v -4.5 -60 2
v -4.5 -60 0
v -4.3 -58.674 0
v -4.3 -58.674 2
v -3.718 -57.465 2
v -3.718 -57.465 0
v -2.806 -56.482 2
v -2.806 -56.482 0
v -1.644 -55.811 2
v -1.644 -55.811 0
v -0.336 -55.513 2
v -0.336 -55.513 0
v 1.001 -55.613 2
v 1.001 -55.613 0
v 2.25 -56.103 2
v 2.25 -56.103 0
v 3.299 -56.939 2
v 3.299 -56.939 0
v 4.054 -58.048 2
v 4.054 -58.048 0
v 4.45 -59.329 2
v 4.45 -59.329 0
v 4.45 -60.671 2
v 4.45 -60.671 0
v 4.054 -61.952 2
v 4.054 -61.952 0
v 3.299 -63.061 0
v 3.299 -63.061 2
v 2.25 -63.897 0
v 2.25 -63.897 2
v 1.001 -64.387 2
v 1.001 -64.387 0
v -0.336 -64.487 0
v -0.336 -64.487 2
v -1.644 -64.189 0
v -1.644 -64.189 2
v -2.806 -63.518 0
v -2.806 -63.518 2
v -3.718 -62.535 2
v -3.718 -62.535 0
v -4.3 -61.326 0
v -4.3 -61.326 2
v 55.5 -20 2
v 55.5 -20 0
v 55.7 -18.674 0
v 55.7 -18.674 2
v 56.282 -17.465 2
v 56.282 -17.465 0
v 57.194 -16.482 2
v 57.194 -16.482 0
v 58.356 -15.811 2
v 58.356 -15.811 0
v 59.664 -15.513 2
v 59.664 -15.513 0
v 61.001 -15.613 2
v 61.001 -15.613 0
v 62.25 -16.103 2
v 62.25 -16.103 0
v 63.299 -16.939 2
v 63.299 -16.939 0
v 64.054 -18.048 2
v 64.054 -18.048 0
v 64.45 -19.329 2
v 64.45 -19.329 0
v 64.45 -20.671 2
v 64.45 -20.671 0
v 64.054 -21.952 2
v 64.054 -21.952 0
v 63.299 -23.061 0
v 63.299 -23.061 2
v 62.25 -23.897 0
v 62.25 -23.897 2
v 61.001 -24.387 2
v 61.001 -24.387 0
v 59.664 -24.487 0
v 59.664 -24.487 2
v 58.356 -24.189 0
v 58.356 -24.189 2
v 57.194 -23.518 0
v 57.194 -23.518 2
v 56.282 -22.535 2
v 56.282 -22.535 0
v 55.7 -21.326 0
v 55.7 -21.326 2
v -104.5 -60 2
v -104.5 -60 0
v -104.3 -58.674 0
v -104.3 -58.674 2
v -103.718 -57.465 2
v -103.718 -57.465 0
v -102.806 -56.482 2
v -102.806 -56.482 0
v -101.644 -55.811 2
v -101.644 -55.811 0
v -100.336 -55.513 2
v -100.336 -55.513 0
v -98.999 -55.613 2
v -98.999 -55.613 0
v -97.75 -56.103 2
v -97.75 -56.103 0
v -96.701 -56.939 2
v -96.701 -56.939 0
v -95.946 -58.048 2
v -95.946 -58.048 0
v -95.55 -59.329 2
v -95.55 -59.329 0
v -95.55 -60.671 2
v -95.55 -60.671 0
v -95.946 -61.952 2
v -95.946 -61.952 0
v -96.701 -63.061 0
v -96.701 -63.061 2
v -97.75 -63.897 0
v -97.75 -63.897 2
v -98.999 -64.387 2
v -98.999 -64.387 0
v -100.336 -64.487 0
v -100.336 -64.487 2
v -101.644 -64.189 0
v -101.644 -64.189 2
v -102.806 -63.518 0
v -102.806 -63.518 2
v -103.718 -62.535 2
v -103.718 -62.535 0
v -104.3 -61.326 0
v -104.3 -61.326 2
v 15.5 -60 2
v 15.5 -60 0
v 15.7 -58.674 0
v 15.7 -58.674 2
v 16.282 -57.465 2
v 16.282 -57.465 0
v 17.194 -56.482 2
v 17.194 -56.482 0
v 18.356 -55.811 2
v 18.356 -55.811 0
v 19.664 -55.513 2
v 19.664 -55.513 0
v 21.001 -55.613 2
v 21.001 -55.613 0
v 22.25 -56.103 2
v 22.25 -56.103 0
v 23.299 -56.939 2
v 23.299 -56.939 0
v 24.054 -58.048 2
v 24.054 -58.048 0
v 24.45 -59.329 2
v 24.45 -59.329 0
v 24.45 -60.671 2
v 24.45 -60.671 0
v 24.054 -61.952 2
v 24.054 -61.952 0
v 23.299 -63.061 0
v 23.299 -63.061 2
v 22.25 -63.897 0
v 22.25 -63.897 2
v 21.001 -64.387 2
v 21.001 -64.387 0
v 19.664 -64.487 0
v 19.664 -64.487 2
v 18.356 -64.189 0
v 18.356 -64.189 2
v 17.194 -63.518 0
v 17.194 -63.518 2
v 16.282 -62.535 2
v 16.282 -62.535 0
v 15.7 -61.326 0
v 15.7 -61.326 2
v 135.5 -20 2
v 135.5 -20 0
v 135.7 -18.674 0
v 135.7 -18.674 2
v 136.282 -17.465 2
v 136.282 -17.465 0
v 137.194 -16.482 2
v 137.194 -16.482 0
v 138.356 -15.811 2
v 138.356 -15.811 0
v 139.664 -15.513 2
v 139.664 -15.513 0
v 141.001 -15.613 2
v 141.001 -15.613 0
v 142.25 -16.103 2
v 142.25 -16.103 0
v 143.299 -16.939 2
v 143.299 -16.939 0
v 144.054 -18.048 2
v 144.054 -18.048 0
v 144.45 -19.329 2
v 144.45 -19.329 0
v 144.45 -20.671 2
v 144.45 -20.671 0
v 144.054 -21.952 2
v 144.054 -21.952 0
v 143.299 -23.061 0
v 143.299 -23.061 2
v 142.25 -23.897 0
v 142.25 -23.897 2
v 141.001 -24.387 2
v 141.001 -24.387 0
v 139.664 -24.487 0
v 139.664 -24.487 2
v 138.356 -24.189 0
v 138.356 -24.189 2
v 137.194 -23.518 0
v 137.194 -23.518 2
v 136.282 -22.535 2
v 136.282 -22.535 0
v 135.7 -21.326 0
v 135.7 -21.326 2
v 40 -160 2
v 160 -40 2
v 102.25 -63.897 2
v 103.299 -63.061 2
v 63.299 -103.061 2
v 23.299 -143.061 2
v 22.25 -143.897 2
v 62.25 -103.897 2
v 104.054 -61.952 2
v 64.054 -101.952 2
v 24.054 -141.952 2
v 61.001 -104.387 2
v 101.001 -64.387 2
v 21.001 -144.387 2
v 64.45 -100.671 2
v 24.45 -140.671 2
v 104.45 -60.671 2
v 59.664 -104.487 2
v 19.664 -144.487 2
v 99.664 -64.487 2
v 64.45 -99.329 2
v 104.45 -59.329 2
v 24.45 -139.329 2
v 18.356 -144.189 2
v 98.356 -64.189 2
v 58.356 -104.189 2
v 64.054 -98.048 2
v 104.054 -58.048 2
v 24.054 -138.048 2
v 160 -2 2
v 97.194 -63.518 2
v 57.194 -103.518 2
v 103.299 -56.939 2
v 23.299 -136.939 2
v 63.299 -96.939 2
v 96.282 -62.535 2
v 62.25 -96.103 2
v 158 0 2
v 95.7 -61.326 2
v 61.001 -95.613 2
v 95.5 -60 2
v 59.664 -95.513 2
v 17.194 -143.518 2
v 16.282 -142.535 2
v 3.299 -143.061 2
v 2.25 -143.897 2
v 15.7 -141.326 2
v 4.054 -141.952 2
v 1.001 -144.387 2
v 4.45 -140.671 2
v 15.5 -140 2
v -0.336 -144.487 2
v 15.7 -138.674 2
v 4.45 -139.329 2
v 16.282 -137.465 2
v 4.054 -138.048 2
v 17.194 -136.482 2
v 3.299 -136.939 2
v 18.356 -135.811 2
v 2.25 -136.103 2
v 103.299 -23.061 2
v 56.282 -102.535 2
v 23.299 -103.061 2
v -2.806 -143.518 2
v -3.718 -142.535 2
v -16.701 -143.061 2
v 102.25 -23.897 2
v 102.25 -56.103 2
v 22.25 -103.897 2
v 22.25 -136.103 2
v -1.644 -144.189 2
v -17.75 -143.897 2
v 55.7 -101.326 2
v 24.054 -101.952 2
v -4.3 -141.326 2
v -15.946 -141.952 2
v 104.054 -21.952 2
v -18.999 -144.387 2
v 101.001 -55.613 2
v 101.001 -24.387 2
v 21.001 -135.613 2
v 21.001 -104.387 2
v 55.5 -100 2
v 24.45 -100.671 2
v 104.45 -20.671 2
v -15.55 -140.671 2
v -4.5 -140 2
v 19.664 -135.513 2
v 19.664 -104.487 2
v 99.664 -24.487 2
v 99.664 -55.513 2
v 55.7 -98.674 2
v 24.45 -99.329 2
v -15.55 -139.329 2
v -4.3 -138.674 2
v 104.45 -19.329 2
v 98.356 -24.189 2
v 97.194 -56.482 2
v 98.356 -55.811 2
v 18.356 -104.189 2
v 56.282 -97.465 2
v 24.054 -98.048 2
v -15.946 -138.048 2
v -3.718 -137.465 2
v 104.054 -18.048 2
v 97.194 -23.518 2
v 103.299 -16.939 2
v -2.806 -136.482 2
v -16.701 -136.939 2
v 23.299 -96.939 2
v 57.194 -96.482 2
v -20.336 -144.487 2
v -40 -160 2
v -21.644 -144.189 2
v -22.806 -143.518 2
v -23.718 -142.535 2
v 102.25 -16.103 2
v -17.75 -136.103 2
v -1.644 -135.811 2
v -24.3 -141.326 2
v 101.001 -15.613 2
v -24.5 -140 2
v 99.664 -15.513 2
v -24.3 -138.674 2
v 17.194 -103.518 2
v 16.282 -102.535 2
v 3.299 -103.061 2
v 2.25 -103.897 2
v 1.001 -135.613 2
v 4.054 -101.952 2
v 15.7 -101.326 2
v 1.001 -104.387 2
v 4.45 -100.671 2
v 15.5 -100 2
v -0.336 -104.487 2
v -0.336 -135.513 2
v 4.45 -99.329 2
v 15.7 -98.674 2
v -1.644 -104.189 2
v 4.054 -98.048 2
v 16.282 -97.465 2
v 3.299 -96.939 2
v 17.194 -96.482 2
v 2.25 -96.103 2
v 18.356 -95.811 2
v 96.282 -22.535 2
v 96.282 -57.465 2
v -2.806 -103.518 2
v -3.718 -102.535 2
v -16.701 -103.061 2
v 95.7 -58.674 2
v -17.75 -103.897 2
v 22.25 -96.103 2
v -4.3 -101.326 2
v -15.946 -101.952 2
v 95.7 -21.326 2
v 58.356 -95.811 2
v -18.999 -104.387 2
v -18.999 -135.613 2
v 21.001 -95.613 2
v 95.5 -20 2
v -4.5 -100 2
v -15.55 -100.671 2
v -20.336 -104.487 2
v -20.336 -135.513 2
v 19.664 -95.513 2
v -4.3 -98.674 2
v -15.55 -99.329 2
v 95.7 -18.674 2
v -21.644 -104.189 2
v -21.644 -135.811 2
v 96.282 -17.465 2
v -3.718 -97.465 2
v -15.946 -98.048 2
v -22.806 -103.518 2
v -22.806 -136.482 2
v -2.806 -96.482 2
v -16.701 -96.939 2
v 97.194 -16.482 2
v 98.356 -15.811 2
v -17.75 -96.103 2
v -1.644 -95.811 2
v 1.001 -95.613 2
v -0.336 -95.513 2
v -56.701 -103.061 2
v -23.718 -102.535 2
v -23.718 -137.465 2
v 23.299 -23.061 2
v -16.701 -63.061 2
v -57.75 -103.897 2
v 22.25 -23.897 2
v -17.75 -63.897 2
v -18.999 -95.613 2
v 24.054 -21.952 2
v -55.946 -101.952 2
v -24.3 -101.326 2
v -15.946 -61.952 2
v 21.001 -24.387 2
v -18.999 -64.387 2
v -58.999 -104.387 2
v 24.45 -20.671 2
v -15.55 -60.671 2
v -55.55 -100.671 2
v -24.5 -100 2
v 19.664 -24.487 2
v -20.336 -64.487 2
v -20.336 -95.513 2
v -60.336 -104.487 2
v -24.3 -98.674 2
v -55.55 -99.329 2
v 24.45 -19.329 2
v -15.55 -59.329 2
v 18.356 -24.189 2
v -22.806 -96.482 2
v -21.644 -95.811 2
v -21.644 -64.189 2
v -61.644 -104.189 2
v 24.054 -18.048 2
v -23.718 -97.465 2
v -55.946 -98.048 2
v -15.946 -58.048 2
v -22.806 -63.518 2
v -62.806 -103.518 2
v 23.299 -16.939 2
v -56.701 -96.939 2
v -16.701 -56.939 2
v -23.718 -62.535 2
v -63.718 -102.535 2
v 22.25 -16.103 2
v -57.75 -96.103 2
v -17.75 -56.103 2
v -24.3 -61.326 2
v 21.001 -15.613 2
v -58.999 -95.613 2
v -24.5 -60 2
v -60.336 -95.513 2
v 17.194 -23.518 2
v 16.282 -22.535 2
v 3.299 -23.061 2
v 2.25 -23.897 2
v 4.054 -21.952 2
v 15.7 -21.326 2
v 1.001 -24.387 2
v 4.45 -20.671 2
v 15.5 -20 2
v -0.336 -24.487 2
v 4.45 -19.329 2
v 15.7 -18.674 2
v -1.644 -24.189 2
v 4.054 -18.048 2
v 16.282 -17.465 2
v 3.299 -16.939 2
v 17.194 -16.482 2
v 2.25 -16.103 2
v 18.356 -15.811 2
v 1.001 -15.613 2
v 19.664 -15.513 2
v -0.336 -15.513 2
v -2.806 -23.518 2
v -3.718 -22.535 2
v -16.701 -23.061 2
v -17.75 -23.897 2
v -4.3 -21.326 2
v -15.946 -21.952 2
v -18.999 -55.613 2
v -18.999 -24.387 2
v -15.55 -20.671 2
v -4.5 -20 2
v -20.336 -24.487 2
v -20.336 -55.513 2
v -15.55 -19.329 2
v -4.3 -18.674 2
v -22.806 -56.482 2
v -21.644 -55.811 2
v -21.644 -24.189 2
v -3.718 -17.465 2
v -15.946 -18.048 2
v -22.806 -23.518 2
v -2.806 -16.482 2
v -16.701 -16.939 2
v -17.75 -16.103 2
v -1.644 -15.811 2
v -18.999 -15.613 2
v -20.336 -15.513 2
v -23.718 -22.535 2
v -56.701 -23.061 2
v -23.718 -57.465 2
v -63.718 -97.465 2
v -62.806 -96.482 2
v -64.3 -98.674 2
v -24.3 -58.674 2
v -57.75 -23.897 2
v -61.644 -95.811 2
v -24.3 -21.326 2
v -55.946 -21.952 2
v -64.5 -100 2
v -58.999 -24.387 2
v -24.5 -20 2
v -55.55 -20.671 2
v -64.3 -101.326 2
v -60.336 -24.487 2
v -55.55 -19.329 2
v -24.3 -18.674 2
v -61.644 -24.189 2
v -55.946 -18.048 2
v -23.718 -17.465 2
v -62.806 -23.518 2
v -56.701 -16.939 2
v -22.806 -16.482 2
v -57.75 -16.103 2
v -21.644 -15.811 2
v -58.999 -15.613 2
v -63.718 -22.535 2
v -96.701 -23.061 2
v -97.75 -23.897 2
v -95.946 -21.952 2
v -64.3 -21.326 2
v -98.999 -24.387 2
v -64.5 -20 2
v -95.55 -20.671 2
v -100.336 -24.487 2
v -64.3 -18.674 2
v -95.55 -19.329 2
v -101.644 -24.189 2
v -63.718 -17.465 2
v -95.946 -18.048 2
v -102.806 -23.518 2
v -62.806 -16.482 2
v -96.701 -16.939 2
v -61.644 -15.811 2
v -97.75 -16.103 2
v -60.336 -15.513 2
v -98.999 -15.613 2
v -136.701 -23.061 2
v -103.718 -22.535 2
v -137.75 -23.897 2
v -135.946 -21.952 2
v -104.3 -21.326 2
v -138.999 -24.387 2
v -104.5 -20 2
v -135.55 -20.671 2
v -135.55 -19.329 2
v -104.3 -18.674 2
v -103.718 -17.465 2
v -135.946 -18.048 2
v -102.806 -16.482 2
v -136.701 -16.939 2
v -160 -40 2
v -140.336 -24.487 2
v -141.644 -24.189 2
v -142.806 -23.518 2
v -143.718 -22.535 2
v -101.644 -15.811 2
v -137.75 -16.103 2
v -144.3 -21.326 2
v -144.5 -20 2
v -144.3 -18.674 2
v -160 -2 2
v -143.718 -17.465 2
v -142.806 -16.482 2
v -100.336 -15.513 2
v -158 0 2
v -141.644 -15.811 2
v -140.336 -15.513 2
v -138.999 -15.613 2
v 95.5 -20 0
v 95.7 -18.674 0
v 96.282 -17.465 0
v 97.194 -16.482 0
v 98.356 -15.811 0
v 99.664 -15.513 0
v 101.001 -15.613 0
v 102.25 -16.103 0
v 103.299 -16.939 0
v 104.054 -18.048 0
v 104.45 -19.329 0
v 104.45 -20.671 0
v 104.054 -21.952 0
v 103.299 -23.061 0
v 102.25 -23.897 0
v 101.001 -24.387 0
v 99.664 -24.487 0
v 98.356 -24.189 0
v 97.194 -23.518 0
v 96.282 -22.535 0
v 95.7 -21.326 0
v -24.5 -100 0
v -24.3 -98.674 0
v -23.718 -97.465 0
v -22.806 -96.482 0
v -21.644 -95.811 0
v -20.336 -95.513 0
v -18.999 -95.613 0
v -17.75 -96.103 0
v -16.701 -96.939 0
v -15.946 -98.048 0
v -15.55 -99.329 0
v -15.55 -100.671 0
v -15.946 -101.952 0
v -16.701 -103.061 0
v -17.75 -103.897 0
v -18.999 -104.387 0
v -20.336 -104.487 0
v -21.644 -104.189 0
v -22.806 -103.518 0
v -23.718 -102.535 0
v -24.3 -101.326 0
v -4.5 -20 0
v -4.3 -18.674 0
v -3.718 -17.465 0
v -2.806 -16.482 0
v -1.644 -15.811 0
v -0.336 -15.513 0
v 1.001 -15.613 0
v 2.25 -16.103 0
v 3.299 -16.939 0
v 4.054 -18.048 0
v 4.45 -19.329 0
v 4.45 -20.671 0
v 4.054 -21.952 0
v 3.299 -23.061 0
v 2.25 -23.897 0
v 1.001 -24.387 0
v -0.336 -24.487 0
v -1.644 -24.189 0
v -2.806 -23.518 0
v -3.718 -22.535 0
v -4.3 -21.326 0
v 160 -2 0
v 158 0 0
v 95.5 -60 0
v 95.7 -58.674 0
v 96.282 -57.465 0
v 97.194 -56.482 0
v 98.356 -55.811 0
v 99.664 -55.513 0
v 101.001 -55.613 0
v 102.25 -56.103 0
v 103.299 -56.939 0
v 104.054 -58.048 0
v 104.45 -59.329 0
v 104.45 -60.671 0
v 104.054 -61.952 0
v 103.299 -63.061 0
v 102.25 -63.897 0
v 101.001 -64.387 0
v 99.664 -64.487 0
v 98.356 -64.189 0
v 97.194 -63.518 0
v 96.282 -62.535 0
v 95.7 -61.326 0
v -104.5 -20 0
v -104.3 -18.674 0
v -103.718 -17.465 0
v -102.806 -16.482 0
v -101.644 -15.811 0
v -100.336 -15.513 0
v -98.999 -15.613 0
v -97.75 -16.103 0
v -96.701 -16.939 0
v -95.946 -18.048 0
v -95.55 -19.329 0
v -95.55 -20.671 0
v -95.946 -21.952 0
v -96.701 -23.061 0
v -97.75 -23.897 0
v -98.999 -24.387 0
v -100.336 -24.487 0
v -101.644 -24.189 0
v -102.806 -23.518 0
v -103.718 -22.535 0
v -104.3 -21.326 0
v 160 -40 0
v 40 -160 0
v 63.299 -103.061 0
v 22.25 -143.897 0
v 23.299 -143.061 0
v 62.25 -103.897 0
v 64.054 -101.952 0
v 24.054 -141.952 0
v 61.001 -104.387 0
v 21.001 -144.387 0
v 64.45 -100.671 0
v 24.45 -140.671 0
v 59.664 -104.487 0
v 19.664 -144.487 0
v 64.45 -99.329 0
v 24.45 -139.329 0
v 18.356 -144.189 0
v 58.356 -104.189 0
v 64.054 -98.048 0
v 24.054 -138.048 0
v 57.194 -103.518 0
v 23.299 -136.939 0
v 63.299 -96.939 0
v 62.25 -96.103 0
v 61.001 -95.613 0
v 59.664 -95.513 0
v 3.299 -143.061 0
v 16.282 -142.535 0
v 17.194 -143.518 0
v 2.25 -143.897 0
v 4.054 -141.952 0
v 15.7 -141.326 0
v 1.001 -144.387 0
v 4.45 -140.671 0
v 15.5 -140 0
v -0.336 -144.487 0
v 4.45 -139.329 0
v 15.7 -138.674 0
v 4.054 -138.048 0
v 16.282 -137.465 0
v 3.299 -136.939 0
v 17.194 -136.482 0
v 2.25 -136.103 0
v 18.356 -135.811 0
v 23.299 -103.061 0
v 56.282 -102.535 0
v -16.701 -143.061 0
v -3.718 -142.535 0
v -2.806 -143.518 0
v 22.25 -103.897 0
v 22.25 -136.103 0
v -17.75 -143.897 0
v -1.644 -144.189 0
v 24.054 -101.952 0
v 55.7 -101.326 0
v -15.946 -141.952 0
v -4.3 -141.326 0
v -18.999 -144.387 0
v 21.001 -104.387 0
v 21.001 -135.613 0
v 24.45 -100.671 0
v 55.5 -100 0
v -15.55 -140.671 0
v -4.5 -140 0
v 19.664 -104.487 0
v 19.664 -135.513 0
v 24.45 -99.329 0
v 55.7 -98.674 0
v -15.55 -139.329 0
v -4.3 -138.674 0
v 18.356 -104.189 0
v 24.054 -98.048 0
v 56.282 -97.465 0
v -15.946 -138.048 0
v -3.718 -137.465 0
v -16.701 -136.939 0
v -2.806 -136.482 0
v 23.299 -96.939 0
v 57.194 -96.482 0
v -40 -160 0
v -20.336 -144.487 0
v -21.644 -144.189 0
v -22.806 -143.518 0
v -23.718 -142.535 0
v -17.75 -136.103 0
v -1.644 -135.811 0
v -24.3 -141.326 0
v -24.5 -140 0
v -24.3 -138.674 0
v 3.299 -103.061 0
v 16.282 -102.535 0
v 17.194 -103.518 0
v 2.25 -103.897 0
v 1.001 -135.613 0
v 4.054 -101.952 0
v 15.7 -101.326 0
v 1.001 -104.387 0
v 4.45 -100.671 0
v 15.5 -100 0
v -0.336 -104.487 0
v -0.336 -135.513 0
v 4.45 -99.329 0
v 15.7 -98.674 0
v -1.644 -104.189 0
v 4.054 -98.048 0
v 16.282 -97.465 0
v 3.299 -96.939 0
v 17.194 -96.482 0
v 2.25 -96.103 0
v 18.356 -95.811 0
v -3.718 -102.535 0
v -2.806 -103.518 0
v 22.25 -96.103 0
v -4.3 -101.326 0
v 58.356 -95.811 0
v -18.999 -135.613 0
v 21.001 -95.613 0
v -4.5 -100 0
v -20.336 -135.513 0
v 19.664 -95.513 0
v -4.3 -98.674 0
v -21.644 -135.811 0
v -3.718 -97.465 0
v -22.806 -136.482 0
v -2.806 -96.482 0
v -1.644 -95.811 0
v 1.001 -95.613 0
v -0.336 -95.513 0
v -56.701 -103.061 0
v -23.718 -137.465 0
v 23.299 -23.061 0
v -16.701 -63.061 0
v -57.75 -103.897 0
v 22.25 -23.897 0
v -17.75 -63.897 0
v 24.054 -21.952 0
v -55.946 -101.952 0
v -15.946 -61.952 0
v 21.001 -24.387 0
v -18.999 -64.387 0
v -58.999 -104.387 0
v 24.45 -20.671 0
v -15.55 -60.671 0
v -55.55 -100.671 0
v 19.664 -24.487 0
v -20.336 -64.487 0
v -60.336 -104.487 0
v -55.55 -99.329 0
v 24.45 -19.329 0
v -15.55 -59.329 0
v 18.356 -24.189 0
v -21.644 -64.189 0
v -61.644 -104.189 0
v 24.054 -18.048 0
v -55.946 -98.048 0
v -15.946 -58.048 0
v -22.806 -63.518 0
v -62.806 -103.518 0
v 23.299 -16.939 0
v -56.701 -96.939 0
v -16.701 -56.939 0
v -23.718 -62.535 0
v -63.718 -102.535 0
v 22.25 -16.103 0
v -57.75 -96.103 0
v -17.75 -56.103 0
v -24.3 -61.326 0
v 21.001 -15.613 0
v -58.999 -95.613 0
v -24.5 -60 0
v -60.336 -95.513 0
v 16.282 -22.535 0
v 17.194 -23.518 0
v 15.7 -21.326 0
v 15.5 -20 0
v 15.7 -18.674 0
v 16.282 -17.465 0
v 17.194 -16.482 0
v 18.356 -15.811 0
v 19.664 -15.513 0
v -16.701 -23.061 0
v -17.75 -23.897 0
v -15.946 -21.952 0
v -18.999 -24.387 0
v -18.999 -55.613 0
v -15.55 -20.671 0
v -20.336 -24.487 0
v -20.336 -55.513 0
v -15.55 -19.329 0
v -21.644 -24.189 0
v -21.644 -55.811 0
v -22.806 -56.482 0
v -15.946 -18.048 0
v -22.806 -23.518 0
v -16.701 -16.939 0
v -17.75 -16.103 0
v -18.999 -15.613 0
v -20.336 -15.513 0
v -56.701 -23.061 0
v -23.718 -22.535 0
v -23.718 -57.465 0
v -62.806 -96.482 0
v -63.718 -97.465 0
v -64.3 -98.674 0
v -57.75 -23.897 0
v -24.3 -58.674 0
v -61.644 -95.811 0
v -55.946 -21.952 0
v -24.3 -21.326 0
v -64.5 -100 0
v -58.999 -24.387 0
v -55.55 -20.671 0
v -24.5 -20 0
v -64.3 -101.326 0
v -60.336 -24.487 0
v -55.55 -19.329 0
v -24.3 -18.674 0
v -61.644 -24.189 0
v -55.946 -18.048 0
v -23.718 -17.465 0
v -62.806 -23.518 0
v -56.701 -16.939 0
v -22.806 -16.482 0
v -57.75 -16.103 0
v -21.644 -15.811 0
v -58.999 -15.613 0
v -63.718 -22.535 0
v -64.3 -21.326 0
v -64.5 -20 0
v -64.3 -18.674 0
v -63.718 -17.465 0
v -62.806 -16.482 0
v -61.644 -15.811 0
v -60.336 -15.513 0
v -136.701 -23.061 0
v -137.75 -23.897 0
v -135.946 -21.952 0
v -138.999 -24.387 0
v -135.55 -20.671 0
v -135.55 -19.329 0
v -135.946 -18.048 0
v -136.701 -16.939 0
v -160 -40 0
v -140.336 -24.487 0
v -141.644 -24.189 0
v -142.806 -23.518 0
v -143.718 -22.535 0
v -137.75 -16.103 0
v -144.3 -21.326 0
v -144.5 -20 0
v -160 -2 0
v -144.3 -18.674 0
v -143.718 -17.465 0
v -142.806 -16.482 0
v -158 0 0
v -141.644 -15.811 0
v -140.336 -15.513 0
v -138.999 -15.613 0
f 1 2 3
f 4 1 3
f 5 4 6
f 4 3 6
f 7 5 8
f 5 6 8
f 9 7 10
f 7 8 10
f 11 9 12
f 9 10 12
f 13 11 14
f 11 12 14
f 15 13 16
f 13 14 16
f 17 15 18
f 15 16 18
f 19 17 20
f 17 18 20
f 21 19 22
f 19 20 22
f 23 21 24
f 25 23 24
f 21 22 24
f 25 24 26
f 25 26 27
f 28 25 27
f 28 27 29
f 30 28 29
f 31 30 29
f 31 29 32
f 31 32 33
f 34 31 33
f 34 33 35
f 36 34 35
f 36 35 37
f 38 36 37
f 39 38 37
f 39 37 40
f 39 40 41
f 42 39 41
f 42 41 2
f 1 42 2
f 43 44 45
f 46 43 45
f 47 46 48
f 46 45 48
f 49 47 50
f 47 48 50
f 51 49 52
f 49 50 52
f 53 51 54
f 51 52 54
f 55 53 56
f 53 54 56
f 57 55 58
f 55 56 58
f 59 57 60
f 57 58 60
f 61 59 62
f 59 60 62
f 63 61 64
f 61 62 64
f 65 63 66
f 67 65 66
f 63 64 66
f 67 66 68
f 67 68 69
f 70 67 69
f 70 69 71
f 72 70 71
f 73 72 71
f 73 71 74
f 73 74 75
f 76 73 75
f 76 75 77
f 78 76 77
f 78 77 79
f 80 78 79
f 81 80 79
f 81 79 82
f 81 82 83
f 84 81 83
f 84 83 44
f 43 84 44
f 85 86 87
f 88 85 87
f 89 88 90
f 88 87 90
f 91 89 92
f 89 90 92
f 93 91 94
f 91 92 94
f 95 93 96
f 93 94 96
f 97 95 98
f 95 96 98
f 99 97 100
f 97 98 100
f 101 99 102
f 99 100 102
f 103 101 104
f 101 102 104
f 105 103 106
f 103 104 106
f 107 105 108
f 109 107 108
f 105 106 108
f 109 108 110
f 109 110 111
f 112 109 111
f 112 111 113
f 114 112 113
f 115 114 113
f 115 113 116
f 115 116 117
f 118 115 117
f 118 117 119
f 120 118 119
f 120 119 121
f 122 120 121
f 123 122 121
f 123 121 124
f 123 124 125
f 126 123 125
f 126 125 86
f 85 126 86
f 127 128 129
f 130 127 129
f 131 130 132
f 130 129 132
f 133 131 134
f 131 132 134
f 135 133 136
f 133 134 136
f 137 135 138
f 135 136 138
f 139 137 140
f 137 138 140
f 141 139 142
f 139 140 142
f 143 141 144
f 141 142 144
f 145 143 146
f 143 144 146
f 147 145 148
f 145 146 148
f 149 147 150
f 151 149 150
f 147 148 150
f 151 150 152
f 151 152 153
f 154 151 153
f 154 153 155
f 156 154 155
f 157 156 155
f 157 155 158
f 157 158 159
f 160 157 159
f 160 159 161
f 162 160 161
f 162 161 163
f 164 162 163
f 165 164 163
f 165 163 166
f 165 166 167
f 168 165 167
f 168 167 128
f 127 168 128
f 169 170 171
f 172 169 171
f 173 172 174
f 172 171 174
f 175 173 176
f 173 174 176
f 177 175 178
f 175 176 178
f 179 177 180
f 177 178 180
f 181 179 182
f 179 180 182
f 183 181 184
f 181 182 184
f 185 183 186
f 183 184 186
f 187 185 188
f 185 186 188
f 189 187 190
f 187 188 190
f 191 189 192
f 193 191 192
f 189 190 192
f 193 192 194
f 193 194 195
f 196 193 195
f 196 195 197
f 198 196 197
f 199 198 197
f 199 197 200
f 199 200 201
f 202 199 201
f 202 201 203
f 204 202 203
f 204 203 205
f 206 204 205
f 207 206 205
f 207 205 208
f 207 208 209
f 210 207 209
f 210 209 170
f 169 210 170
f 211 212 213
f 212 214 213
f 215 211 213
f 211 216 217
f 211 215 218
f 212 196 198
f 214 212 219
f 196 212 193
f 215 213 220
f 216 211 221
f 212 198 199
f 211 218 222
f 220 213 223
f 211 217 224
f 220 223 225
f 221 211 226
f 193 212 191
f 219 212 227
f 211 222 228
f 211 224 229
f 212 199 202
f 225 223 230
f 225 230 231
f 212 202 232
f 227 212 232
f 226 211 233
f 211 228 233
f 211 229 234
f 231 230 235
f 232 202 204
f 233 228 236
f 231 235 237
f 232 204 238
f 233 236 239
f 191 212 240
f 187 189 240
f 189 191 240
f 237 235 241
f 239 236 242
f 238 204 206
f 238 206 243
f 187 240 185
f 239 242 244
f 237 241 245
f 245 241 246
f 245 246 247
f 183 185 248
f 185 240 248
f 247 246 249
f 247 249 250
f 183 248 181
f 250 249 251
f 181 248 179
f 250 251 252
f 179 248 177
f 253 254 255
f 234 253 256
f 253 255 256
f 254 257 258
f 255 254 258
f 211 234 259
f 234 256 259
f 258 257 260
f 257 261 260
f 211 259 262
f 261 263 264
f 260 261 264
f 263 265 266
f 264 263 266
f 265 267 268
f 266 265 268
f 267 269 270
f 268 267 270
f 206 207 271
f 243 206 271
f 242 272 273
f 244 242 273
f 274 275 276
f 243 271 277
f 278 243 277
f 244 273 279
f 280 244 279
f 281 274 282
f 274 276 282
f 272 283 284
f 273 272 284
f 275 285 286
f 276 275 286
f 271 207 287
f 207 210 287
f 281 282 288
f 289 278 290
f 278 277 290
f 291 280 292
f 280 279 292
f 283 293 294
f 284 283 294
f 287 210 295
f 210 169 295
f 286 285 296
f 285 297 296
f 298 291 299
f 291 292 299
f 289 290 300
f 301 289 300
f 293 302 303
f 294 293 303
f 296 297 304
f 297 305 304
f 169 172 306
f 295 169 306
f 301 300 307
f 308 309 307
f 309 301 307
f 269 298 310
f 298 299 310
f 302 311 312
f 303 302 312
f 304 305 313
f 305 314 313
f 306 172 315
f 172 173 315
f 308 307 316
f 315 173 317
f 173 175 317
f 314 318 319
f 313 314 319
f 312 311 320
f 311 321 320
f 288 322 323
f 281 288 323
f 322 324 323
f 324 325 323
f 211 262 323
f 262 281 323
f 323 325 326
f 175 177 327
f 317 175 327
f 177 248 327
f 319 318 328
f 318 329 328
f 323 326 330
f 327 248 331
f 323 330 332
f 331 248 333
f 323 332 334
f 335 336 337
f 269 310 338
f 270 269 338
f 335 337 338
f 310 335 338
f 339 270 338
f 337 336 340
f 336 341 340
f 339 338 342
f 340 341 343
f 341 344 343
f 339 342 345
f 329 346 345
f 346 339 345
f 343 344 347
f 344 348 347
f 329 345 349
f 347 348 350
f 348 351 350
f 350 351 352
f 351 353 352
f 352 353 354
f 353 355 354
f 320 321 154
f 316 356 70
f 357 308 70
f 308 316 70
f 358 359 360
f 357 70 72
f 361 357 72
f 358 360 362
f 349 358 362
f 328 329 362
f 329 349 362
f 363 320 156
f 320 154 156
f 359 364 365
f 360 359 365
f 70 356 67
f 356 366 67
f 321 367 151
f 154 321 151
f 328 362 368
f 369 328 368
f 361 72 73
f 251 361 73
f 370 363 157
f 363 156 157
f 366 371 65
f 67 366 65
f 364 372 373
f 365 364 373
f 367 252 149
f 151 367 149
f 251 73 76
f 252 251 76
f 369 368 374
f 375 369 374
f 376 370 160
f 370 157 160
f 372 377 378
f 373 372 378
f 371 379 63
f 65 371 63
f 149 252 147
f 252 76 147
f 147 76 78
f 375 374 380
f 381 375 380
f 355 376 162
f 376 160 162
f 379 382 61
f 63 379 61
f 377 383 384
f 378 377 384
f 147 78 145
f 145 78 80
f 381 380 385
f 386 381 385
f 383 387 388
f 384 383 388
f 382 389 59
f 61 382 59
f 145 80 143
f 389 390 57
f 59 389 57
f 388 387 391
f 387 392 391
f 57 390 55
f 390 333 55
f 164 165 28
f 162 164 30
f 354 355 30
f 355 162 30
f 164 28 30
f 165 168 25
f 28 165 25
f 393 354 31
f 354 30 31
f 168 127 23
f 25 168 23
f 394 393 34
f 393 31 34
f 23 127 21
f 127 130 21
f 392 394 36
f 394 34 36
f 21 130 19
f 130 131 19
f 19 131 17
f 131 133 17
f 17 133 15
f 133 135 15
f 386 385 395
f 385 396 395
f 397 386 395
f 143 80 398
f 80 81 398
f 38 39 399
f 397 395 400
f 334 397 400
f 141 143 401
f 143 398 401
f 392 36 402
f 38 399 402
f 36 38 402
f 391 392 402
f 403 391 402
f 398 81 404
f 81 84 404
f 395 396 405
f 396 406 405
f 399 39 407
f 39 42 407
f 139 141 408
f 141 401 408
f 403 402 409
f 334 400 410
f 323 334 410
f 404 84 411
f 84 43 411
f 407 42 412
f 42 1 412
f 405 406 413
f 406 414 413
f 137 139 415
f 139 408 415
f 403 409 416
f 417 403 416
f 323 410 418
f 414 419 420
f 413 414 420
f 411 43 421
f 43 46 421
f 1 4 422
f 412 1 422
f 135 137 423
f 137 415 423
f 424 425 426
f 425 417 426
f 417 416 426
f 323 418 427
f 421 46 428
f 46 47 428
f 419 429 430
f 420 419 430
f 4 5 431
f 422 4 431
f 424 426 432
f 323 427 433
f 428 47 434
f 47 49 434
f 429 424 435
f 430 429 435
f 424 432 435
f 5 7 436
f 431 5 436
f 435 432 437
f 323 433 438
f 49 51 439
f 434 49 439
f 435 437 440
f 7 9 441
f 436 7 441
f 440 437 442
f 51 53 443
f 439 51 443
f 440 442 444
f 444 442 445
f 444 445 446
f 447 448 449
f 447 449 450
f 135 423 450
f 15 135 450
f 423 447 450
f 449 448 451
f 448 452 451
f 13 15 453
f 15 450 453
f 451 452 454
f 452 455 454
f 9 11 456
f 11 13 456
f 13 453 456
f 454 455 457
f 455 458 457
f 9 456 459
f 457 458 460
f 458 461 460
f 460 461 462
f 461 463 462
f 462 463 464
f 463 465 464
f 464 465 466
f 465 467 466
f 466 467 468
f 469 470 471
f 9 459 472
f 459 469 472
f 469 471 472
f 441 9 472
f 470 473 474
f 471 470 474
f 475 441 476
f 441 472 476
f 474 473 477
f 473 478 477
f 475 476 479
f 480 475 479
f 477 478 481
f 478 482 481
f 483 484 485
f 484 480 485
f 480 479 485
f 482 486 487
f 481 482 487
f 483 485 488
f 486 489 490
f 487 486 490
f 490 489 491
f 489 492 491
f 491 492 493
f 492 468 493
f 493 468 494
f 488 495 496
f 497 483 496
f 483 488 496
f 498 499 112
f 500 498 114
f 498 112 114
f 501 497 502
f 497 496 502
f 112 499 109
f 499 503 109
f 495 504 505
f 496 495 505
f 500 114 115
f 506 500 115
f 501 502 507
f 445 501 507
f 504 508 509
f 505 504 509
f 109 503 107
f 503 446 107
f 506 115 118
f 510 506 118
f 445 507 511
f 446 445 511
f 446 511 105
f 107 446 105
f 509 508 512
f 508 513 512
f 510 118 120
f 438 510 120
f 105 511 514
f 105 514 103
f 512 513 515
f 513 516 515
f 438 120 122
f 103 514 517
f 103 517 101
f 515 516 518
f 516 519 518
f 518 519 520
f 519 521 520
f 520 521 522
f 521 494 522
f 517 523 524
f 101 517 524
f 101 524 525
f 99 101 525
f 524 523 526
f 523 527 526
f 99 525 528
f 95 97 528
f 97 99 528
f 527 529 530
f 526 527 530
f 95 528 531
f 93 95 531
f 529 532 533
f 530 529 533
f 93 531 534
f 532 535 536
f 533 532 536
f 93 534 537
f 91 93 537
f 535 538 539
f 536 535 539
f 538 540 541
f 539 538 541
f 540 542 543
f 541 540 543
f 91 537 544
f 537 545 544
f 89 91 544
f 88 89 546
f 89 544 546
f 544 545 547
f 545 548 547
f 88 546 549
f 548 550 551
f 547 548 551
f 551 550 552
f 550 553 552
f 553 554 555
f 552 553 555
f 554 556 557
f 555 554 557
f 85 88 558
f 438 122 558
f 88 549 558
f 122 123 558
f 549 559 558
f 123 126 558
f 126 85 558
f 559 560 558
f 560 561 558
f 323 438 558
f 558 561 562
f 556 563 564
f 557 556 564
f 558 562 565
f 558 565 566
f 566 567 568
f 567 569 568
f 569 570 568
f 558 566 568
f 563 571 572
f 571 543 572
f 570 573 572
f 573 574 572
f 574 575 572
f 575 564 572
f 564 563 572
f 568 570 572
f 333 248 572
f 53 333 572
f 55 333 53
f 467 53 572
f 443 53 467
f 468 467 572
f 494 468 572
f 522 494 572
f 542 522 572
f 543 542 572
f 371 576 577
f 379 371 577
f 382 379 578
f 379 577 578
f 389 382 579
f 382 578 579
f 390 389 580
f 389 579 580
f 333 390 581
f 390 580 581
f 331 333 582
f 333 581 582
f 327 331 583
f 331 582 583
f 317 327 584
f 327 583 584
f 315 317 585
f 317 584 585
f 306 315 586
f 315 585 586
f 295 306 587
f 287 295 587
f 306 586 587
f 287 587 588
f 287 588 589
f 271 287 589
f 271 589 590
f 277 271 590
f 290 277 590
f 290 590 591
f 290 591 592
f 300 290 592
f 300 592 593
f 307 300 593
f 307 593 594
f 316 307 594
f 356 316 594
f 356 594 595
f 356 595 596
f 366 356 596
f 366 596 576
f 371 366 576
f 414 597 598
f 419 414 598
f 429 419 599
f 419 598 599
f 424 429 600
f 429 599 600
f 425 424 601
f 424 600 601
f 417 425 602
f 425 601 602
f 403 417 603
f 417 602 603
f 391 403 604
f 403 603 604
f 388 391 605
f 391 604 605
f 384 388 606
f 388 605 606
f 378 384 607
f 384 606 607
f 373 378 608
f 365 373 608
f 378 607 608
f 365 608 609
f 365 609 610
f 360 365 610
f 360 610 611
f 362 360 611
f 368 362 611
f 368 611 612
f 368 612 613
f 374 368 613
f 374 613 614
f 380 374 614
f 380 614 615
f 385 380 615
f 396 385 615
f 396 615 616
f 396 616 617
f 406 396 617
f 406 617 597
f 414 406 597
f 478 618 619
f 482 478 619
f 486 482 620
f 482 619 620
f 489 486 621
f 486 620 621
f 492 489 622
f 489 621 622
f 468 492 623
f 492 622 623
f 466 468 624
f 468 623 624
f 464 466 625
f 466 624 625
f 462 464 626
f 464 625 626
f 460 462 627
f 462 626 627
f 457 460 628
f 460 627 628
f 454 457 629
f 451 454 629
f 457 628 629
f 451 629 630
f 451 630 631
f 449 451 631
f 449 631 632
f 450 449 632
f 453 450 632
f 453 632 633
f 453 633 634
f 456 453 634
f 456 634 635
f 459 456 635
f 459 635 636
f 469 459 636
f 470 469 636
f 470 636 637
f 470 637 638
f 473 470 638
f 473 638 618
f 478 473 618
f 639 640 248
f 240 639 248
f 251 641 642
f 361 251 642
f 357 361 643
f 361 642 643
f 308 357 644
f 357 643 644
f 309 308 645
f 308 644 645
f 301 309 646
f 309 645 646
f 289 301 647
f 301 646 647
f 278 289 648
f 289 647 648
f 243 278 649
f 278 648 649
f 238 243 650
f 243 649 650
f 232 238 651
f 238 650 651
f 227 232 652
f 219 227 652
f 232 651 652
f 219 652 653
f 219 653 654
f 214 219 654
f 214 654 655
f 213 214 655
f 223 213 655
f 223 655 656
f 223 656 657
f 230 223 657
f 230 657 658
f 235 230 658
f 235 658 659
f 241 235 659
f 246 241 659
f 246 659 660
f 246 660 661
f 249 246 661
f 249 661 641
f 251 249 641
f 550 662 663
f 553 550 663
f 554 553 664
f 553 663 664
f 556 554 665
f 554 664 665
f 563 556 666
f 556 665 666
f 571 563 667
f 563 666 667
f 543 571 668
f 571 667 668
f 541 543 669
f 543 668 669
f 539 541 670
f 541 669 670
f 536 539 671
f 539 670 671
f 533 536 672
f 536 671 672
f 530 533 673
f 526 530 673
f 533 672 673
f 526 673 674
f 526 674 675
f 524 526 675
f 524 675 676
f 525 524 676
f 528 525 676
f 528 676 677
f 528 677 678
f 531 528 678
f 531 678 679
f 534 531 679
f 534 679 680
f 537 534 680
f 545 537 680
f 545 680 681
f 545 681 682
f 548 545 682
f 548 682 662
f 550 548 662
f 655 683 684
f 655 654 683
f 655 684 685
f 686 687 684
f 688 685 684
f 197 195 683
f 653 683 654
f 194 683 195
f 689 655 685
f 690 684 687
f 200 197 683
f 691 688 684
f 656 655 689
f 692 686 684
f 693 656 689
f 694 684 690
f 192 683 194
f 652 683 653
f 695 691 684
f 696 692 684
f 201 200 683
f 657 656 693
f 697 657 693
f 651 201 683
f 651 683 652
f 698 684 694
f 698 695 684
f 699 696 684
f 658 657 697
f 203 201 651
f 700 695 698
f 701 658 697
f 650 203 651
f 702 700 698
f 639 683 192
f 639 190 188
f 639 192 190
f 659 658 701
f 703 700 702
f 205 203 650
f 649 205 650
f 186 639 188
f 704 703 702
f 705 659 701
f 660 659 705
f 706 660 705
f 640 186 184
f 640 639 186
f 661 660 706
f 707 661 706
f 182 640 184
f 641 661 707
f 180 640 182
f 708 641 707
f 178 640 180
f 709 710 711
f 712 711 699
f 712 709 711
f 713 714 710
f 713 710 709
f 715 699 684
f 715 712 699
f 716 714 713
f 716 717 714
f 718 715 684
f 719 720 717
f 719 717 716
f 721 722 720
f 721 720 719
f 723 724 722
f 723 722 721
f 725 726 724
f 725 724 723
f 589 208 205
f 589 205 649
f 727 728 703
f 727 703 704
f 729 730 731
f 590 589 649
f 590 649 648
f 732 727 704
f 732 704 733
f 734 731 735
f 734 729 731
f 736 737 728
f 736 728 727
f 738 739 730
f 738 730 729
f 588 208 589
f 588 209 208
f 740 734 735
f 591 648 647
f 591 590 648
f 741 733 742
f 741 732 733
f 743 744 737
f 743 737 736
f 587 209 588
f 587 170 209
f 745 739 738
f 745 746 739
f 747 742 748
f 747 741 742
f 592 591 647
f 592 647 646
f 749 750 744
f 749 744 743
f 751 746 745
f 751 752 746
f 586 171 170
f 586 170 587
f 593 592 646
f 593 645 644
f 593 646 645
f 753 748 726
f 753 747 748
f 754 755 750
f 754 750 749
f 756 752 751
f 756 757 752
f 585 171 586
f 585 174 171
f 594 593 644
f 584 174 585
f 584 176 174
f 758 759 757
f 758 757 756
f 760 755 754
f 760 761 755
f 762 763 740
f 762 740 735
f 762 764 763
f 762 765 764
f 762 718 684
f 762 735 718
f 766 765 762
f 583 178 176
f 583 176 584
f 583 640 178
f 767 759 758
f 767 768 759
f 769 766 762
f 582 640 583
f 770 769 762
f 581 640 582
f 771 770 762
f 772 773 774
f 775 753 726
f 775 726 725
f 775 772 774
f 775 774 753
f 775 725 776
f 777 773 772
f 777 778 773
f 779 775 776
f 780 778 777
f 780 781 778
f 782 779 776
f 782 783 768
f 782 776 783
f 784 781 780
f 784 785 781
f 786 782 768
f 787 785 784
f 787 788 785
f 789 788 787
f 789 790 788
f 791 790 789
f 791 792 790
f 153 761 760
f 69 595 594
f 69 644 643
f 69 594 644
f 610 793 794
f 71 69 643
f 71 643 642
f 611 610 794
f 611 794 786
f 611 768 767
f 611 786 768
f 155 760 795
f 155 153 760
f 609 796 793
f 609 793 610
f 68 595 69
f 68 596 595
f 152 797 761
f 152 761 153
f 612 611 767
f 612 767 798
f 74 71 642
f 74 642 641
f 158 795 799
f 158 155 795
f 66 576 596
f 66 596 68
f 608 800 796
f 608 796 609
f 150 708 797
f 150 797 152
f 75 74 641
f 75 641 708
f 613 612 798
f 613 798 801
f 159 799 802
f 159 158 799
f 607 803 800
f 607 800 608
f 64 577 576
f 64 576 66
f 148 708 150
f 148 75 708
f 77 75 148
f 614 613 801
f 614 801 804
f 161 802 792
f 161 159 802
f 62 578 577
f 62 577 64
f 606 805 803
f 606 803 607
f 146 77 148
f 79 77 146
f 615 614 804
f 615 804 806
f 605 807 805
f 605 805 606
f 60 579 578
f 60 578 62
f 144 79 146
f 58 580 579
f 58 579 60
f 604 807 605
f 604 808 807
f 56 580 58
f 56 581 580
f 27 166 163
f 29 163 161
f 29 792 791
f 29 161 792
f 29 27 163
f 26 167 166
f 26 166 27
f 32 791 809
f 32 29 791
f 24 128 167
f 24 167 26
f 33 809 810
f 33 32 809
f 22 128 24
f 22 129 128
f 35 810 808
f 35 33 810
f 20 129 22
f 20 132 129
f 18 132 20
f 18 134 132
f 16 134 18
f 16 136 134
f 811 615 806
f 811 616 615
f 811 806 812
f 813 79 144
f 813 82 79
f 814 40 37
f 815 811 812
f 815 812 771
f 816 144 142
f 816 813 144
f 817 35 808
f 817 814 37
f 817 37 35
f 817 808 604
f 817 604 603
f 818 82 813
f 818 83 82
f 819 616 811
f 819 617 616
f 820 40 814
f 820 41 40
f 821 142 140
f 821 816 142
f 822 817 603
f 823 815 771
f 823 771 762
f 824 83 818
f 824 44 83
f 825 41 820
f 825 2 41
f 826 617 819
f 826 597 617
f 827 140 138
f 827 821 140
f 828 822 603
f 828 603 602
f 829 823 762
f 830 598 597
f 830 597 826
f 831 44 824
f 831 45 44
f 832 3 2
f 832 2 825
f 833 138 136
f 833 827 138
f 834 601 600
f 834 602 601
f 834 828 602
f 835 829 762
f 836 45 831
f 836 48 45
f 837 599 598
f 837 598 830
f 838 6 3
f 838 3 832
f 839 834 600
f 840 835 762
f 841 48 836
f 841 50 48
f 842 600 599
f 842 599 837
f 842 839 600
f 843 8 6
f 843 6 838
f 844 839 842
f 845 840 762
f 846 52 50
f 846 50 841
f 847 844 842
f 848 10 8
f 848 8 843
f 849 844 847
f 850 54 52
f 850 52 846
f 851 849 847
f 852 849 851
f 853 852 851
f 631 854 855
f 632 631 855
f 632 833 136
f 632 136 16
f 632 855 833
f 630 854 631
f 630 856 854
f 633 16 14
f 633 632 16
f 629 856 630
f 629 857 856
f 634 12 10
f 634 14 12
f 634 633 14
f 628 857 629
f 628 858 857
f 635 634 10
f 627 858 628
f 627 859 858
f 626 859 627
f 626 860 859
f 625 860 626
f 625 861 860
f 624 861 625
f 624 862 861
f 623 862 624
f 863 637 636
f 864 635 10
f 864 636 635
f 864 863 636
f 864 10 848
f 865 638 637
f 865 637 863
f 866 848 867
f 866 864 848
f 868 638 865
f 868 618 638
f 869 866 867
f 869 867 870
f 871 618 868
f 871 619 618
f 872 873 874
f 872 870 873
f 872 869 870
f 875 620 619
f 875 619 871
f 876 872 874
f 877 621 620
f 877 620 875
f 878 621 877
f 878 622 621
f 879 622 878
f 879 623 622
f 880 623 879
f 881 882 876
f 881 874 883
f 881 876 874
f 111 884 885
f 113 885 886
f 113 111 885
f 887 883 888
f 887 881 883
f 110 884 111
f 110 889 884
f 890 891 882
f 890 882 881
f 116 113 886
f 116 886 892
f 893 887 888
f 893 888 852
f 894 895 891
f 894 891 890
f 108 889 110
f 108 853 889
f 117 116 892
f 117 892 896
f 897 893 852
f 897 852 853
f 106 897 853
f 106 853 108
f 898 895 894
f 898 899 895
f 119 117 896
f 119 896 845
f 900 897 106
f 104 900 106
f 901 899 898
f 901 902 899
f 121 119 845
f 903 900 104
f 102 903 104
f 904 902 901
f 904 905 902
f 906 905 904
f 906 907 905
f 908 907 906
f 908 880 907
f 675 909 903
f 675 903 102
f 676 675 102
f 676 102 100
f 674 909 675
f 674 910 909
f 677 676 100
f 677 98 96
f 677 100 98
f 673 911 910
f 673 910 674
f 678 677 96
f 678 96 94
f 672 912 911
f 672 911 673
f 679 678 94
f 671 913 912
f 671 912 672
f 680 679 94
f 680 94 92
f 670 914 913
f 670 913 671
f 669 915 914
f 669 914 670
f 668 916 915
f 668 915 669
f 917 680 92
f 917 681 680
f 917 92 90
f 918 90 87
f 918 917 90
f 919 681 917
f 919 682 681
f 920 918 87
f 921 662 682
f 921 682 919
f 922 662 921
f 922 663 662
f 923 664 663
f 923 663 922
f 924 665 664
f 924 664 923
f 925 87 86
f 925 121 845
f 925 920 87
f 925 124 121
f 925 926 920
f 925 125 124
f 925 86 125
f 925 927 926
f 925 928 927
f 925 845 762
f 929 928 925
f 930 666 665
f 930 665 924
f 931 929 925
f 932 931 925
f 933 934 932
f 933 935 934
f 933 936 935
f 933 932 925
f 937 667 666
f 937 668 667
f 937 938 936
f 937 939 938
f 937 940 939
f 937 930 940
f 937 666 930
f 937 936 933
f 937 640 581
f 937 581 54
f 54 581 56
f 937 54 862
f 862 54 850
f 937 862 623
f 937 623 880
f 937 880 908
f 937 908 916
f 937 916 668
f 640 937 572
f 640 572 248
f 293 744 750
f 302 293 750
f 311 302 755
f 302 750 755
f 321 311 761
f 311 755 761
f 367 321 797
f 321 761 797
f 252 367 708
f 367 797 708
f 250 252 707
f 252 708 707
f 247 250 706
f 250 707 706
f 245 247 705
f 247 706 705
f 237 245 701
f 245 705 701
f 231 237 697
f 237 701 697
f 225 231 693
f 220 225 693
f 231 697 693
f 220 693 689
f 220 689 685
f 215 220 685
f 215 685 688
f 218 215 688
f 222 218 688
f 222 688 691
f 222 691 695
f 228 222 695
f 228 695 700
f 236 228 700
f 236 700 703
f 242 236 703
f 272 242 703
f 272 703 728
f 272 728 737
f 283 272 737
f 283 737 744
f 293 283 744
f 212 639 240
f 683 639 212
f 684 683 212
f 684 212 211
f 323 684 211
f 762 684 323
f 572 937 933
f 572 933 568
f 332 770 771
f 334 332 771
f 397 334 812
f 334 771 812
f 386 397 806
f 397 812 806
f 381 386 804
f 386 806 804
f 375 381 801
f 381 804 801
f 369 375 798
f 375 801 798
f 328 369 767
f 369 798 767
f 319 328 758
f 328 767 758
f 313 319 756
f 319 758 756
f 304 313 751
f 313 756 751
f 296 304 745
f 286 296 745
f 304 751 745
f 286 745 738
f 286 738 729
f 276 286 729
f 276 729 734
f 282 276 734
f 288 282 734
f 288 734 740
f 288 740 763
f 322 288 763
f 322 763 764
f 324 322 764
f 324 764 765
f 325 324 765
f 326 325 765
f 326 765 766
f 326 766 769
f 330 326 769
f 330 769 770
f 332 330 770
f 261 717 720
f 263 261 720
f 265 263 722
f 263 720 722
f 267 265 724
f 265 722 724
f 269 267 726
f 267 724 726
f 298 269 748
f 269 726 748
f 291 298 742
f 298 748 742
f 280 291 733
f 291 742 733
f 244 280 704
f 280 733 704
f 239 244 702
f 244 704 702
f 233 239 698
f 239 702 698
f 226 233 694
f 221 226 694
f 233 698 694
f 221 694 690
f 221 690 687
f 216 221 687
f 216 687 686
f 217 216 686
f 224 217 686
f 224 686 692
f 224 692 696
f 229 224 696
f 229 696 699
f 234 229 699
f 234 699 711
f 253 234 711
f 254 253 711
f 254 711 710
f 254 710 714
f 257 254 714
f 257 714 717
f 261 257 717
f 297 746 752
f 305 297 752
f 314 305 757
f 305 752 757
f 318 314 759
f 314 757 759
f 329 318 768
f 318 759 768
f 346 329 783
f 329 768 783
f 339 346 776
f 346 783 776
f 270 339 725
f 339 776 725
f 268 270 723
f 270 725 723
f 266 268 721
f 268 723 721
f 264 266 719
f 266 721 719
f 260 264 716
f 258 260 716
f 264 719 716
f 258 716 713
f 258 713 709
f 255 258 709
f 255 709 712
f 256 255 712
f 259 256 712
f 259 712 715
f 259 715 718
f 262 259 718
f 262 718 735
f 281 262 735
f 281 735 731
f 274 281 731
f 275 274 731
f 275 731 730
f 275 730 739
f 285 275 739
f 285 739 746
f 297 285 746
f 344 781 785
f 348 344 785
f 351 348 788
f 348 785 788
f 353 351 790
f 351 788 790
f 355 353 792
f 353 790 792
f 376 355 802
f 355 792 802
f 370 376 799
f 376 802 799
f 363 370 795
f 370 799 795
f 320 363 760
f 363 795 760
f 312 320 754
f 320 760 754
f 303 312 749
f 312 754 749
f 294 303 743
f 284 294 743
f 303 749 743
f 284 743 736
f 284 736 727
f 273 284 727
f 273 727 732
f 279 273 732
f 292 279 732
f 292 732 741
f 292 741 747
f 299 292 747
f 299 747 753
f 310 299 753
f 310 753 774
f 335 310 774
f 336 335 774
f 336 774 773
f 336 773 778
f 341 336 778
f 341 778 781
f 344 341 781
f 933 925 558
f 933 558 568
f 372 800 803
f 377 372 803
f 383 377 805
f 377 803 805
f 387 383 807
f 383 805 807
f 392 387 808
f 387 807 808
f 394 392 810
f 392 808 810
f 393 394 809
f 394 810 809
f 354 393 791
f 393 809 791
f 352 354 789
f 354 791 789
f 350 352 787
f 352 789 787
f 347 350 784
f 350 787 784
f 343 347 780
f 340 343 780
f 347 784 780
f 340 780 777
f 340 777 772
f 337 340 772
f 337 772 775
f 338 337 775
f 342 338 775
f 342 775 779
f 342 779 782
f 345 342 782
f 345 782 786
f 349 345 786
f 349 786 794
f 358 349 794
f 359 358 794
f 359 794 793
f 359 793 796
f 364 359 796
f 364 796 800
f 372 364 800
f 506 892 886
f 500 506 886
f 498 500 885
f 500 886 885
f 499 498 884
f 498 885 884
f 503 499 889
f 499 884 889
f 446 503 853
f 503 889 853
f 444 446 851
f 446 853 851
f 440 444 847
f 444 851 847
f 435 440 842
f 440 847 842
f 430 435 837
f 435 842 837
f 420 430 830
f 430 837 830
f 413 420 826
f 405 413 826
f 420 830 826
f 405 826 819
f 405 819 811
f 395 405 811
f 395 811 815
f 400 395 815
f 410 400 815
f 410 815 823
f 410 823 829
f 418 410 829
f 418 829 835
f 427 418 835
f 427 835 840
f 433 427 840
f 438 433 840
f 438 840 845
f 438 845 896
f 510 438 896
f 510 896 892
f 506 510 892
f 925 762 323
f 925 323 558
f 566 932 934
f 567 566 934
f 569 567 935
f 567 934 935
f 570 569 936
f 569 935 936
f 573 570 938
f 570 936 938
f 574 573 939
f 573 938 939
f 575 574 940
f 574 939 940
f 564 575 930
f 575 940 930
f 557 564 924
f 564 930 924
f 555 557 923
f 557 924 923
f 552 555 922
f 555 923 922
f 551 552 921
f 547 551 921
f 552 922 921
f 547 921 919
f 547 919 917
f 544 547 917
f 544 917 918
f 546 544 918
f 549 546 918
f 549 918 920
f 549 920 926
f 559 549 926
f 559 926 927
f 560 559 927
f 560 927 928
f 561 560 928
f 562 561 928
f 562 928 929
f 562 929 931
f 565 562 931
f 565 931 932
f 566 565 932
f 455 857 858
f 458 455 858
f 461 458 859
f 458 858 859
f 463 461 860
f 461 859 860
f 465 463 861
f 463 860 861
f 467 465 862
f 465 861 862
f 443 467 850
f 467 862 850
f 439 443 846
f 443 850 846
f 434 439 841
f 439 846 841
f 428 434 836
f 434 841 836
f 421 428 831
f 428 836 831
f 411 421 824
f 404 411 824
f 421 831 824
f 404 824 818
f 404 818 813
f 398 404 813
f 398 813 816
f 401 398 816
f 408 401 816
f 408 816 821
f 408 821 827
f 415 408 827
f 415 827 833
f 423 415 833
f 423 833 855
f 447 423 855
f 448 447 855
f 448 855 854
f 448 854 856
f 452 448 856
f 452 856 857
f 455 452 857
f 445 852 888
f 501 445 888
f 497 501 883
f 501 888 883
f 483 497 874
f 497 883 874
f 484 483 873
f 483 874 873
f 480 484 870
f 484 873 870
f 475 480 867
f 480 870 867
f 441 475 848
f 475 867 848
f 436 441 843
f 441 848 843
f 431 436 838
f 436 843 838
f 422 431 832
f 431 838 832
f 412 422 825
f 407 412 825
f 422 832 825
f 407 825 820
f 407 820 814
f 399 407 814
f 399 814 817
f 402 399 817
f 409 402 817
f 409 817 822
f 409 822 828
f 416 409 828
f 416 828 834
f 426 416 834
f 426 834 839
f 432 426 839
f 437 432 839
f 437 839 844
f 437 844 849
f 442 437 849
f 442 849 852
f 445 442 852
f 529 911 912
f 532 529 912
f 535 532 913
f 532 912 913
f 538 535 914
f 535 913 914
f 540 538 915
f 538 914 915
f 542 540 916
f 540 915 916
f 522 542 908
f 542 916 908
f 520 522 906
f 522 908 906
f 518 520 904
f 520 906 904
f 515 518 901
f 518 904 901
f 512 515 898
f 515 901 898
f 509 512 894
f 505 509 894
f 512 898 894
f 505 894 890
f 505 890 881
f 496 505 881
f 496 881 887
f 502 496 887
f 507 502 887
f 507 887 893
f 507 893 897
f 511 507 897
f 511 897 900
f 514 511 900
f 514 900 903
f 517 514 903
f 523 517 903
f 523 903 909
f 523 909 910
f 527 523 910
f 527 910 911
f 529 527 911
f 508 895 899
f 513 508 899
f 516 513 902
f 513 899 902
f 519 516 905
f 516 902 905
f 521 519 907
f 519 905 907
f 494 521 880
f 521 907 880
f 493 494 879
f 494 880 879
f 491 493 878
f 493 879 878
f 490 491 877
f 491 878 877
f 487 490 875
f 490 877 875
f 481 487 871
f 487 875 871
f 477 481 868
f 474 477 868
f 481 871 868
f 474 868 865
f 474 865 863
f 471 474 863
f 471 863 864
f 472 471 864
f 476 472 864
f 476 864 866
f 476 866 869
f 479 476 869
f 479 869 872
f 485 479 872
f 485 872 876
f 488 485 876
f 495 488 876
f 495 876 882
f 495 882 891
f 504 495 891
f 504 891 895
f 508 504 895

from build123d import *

# Parameters (mm, degrees)
EXTRUDE_1_DEPTH   = 2
CHAMFER_1_SIZE    = 2
HOLE_WIZARD_M81_D = 9


with BuildPart() as part:
    # Эскиз1 → Бобышка-Вытянуть1 (new body)
    with BuildSketch(Plane.XY):
        Polygon((160, -40), (40, -160), (-40, -160), (-160, -40), (-160, 0), (160, 0), align=None)
    extrude(amount=EXTRUDE_1_DEPTH)

    # Фаска1
    chamfer_1_edges = [part.edges().sort_by_distance(p)[0] for p in [
        (160, 0, 1),
        (-160, 0, 1),
    ]]
    chamfer(chamfer_1_edges, length=CHAMFER_1_SIZE)

    # Отверстие с зазором M81 (through all)
    with Locations(Plane.XY.offset(2)):
        with Locations((60, -100), (0, -20), (20, -20), (-20, -20), (-20, -60), (-20, -100), (-20, -140), (0, -60), (0, -100), (0, -140), (20, -60), (20, -100), (20, -140), (-60, -20), (-100, -20), (-140, -20), (60, -20), (100, -20), (140, -20), (-100, -60), (100, -60), (-60, -100)):
            Hole(HOLE_WIZARD_M81_D / 2)


solid = part.part
